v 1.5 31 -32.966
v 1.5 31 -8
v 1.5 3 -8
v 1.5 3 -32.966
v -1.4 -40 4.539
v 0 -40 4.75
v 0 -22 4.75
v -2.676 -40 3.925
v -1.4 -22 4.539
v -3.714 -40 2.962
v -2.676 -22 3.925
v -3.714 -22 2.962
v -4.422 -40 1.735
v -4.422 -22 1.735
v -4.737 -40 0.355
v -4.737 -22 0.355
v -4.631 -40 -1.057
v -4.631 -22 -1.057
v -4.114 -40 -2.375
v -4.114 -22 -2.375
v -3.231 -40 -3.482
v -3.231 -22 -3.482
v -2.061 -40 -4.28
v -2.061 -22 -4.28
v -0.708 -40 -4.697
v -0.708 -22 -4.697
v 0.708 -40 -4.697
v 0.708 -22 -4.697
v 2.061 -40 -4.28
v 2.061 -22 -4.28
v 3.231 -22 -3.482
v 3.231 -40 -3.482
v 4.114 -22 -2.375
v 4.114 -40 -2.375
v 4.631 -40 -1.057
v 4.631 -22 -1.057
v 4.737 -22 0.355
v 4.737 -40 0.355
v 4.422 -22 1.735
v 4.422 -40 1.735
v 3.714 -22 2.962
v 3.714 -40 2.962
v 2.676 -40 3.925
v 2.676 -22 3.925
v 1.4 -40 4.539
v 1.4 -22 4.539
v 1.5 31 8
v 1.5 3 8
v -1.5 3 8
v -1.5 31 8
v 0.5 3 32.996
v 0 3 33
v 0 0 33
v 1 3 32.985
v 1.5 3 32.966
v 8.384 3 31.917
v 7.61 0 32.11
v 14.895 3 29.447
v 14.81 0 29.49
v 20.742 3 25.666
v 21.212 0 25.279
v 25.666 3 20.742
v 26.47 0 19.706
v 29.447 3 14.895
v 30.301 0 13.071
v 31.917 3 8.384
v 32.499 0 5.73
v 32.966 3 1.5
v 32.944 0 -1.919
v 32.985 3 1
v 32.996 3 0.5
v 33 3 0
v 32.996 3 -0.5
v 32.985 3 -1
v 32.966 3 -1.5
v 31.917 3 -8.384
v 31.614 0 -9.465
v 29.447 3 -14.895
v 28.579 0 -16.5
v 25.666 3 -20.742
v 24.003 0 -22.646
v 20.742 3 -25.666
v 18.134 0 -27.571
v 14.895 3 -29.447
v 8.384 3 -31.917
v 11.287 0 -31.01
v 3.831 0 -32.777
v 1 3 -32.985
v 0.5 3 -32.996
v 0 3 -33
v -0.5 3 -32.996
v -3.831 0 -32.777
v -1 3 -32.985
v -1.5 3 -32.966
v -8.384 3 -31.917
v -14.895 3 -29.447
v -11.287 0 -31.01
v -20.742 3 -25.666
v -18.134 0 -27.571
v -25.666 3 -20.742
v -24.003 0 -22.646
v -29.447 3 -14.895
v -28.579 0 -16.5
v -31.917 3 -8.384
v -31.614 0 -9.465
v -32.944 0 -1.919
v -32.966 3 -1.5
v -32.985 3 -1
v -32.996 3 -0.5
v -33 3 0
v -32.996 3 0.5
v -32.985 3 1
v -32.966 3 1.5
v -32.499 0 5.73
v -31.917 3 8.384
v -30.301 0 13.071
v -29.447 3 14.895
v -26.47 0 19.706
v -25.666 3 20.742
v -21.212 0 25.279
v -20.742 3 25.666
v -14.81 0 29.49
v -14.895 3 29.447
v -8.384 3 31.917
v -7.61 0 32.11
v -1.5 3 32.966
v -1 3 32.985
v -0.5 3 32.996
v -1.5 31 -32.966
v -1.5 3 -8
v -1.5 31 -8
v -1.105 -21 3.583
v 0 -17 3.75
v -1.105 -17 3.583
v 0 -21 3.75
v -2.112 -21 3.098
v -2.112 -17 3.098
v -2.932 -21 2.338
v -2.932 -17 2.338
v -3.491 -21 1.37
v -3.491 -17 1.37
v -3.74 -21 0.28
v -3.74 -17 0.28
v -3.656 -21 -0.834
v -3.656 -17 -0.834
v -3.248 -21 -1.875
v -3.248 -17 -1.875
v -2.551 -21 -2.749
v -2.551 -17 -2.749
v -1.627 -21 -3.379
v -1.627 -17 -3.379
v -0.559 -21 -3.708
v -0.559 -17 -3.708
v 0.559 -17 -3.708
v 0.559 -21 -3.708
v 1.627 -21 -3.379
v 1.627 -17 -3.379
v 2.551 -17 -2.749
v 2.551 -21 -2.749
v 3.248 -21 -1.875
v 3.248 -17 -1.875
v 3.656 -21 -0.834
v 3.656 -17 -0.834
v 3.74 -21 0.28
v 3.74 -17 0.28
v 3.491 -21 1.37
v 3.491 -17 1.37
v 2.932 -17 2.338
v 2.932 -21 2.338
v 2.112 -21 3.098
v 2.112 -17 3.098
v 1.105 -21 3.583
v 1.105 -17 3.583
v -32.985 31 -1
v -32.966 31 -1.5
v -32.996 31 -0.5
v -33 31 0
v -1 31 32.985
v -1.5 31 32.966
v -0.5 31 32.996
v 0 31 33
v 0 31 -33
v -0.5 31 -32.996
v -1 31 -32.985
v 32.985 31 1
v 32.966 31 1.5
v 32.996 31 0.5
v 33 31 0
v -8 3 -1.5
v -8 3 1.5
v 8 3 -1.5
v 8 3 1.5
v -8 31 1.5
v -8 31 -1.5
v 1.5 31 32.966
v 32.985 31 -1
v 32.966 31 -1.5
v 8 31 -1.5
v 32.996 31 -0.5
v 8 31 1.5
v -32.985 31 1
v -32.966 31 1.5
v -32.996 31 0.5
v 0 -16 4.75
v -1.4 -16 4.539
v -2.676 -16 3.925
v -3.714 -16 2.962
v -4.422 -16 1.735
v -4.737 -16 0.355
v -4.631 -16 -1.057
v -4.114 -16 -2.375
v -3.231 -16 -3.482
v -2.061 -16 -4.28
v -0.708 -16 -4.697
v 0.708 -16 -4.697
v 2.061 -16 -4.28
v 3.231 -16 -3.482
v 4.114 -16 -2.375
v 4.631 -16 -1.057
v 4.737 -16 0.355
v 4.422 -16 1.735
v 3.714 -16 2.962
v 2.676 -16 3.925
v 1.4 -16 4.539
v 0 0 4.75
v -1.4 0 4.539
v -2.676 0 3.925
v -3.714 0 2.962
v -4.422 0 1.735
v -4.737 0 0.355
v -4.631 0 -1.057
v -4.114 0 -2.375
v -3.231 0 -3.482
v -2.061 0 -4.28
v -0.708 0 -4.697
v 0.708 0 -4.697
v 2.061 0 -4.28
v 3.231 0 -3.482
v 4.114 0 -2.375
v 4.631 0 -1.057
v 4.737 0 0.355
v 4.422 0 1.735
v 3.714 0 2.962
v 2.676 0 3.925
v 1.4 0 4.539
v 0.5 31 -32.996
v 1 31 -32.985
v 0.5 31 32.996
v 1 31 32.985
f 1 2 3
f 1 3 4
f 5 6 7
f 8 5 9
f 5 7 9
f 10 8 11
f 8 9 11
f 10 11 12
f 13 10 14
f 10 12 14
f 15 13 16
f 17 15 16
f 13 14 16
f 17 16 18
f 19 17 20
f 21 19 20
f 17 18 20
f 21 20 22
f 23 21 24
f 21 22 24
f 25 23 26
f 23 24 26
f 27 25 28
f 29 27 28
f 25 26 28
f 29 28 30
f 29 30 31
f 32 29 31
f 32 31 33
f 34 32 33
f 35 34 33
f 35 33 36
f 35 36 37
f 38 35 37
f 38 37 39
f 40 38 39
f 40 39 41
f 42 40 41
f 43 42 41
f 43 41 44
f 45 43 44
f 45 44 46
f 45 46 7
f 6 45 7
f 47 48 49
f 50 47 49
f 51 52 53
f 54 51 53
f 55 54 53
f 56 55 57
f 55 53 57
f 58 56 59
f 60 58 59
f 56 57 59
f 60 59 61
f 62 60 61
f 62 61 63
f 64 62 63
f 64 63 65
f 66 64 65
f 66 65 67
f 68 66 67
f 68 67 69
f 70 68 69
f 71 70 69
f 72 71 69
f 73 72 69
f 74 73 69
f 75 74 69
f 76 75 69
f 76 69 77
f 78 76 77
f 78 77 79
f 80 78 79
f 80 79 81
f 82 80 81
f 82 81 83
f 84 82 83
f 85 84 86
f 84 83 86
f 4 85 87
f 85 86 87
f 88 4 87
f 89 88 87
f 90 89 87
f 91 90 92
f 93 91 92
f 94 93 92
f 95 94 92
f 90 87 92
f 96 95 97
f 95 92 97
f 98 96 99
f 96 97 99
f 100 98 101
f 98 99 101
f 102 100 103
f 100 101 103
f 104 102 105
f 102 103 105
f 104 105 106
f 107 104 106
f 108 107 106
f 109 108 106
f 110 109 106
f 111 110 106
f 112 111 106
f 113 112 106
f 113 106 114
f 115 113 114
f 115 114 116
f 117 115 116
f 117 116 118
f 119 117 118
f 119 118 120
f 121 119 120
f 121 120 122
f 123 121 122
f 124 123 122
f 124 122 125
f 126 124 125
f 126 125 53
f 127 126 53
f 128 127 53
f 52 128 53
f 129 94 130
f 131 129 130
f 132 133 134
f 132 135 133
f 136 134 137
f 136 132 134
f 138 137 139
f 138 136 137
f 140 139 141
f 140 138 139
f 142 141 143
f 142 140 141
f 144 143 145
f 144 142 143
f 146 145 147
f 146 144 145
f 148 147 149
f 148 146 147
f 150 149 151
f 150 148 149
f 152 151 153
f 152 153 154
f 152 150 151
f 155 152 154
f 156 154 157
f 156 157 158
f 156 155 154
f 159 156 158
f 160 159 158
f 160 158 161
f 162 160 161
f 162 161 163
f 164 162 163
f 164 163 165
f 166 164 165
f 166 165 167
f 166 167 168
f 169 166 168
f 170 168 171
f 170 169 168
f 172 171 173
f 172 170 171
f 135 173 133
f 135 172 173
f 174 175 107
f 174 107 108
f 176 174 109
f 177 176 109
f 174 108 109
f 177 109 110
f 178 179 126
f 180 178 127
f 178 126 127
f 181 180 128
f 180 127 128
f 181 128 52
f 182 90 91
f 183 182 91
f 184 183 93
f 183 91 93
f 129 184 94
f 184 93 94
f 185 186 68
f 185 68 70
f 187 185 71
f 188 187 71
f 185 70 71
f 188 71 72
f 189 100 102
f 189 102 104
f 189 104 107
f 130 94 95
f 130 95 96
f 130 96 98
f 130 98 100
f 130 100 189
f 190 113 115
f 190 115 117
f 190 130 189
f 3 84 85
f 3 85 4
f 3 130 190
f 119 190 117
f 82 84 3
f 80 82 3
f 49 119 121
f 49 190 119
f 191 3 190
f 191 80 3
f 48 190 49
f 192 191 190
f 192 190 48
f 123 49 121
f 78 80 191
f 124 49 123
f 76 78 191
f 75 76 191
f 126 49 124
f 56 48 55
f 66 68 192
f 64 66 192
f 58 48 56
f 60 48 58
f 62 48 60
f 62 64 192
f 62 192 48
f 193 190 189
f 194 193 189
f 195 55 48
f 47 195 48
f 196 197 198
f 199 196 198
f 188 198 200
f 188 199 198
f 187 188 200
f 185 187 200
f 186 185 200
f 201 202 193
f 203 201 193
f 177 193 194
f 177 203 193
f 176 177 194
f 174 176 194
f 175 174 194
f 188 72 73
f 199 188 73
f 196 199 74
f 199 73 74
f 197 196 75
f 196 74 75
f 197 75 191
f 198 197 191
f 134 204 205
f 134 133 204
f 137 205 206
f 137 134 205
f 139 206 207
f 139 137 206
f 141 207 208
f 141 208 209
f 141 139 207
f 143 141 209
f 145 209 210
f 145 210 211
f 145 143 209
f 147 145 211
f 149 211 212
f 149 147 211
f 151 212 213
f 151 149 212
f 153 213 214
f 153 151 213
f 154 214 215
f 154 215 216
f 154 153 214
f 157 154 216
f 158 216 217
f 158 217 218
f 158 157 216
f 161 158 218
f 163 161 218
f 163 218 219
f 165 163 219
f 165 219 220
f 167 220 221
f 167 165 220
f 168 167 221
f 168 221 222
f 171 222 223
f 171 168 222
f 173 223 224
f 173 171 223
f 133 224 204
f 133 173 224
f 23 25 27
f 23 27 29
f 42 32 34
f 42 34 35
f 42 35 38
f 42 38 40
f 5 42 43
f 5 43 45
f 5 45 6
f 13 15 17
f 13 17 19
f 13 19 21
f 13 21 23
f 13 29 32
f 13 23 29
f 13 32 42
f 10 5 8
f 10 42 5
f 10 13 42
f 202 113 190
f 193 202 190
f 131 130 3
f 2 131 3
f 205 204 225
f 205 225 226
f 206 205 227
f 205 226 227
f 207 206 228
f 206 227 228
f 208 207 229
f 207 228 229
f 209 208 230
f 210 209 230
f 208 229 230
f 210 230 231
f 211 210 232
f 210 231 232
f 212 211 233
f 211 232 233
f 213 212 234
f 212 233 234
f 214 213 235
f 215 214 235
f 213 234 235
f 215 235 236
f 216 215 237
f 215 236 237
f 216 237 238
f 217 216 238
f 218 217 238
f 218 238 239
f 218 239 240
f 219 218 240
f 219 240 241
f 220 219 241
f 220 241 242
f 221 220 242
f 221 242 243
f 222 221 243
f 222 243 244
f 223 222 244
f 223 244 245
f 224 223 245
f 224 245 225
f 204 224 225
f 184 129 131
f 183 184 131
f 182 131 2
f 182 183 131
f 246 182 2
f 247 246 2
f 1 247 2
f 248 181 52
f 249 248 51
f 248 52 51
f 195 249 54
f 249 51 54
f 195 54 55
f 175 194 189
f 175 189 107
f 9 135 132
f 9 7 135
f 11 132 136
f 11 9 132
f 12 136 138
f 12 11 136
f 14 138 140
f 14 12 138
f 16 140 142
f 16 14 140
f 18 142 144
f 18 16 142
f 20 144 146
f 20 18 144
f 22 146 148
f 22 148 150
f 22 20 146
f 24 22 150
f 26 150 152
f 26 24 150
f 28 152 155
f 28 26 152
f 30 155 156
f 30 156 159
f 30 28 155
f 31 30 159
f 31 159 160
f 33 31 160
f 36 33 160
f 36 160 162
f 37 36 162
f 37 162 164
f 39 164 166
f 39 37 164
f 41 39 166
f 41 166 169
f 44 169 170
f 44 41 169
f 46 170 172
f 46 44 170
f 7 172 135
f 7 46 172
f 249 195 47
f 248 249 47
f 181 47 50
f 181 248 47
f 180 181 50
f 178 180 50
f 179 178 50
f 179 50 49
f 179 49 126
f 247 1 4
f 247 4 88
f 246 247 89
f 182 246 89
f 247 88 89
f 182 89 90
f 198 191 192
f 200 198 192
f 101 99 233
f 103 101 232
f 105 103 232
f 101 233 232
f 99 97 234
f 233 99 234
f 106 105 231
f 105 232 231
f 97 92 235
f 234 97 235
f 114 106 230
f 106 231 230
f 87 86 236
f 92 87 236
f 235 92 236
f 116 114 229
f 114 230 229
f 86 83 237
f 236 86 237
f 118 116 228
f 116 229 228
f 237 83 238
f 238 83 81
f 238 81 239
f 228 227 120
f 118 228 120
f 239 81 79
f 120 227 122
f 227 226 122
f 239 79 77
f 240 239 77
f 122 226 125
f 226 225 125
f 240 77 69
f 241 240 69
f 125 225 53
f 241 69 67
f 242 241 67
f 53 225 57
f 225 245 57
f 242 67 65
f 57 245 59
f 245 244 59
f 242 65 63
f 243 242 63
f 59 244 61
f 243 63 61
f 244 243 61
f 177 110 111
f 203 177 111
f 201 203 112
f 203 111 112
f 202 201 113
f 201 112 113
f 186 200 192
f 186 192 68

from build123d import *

# Parameters (mm, degrees)
SKETCH1_R           = 33
BOSS_EXTRUDE1_DEPTH = 3
BOSS_EXTRUDE2_DEPTH = 28
CIRPATTERN1_COUNT   = 4
SKETCH5_R           = 4.75
BOSS_EXTRUDE3_DEPTH = 40


with BuildPart() as part:
    # Sketch1 → Boss-Extrude1 (new body)
    with BuildSketch(Plane(origin=(0, 0, 0), x_dir=(1, 0, 0), z_dir=(0, 1, 0))):
        with Locations(Location((0, 0, 0), (0, 0, 270))):
            Circle(SKETCH1_R)
    extrude(amount=BOSS_EXTRUDE1_DEPTH)

    # Sketch2 → Boss-Extrude2 (add)
    with BuildSketch(Plane(origin=(0, 3, 0), x_dir=(1, 0, 0), z_dir=(0, 1, 0))):
        with BuildLine():
            ThreePointArc((1.5, 32.965891464), (0.750193874, 32.991471764), (0, 33))
            Line((0, 33), (0, 8))
            Line((0, 8), (1.5, 8))
            Line((1.5, 8), (1.5, 32.965891464))
        make_face()
        with BuildLine():
            Line((0, 8), (0, 33))
            ThreePointArc((0, 33), (-0.750193874, 32.991471764), (-1.5, 32.965891464))
            Line((-1.5, 32.965891464), (-1.5, 8))
            Line((-1.5, 8), (0, 8))
        make_face()
    boss_extrude2 = extrude(amount=BOSS_EXTRUDE2_DEPTH)

    # CirPattern1: Boss-Extrude2 ×4 about axis
    cirpattern1_axis = Axis((0, 0, 0), (0, 1, 0))
    for i in range(1, CIRPATTERN1_COUNT):
        add(boss_extrude2.rotate(cirpattern1_axis, i * 360 / CIRPATTERN1_COUNT))

    # Sketch5 → Boss-Extrude3 (add)
    with BuildSketch(Plane.XZ):
        with Locations(Location((0, 0, 0), (0, 0, 90))):
            Circle(SKETCH5_R)
    extrude(amount=BOSS_EXTRUDE3_DEPTH)

    # Sketch6 → Cut-Revolve1 (revolve, cut)
    with BuildSketch(Plane.XY, mode=Mode.PRIVATE) as cut_revolve1_sk:
        Polygon((-4.75, -16), (-3.75, -17), (-3.75, -21), (-4.75, -22), align=None)
    revolve(cut_revolve1_sk.sketch.rotate(Axis((0, 0, 0), (0, -1, 0)), 270), axis=Axis((0, 0, 0), (0, -1, 0)), mode=Mode.SUBTRACT)


solid = part.part
